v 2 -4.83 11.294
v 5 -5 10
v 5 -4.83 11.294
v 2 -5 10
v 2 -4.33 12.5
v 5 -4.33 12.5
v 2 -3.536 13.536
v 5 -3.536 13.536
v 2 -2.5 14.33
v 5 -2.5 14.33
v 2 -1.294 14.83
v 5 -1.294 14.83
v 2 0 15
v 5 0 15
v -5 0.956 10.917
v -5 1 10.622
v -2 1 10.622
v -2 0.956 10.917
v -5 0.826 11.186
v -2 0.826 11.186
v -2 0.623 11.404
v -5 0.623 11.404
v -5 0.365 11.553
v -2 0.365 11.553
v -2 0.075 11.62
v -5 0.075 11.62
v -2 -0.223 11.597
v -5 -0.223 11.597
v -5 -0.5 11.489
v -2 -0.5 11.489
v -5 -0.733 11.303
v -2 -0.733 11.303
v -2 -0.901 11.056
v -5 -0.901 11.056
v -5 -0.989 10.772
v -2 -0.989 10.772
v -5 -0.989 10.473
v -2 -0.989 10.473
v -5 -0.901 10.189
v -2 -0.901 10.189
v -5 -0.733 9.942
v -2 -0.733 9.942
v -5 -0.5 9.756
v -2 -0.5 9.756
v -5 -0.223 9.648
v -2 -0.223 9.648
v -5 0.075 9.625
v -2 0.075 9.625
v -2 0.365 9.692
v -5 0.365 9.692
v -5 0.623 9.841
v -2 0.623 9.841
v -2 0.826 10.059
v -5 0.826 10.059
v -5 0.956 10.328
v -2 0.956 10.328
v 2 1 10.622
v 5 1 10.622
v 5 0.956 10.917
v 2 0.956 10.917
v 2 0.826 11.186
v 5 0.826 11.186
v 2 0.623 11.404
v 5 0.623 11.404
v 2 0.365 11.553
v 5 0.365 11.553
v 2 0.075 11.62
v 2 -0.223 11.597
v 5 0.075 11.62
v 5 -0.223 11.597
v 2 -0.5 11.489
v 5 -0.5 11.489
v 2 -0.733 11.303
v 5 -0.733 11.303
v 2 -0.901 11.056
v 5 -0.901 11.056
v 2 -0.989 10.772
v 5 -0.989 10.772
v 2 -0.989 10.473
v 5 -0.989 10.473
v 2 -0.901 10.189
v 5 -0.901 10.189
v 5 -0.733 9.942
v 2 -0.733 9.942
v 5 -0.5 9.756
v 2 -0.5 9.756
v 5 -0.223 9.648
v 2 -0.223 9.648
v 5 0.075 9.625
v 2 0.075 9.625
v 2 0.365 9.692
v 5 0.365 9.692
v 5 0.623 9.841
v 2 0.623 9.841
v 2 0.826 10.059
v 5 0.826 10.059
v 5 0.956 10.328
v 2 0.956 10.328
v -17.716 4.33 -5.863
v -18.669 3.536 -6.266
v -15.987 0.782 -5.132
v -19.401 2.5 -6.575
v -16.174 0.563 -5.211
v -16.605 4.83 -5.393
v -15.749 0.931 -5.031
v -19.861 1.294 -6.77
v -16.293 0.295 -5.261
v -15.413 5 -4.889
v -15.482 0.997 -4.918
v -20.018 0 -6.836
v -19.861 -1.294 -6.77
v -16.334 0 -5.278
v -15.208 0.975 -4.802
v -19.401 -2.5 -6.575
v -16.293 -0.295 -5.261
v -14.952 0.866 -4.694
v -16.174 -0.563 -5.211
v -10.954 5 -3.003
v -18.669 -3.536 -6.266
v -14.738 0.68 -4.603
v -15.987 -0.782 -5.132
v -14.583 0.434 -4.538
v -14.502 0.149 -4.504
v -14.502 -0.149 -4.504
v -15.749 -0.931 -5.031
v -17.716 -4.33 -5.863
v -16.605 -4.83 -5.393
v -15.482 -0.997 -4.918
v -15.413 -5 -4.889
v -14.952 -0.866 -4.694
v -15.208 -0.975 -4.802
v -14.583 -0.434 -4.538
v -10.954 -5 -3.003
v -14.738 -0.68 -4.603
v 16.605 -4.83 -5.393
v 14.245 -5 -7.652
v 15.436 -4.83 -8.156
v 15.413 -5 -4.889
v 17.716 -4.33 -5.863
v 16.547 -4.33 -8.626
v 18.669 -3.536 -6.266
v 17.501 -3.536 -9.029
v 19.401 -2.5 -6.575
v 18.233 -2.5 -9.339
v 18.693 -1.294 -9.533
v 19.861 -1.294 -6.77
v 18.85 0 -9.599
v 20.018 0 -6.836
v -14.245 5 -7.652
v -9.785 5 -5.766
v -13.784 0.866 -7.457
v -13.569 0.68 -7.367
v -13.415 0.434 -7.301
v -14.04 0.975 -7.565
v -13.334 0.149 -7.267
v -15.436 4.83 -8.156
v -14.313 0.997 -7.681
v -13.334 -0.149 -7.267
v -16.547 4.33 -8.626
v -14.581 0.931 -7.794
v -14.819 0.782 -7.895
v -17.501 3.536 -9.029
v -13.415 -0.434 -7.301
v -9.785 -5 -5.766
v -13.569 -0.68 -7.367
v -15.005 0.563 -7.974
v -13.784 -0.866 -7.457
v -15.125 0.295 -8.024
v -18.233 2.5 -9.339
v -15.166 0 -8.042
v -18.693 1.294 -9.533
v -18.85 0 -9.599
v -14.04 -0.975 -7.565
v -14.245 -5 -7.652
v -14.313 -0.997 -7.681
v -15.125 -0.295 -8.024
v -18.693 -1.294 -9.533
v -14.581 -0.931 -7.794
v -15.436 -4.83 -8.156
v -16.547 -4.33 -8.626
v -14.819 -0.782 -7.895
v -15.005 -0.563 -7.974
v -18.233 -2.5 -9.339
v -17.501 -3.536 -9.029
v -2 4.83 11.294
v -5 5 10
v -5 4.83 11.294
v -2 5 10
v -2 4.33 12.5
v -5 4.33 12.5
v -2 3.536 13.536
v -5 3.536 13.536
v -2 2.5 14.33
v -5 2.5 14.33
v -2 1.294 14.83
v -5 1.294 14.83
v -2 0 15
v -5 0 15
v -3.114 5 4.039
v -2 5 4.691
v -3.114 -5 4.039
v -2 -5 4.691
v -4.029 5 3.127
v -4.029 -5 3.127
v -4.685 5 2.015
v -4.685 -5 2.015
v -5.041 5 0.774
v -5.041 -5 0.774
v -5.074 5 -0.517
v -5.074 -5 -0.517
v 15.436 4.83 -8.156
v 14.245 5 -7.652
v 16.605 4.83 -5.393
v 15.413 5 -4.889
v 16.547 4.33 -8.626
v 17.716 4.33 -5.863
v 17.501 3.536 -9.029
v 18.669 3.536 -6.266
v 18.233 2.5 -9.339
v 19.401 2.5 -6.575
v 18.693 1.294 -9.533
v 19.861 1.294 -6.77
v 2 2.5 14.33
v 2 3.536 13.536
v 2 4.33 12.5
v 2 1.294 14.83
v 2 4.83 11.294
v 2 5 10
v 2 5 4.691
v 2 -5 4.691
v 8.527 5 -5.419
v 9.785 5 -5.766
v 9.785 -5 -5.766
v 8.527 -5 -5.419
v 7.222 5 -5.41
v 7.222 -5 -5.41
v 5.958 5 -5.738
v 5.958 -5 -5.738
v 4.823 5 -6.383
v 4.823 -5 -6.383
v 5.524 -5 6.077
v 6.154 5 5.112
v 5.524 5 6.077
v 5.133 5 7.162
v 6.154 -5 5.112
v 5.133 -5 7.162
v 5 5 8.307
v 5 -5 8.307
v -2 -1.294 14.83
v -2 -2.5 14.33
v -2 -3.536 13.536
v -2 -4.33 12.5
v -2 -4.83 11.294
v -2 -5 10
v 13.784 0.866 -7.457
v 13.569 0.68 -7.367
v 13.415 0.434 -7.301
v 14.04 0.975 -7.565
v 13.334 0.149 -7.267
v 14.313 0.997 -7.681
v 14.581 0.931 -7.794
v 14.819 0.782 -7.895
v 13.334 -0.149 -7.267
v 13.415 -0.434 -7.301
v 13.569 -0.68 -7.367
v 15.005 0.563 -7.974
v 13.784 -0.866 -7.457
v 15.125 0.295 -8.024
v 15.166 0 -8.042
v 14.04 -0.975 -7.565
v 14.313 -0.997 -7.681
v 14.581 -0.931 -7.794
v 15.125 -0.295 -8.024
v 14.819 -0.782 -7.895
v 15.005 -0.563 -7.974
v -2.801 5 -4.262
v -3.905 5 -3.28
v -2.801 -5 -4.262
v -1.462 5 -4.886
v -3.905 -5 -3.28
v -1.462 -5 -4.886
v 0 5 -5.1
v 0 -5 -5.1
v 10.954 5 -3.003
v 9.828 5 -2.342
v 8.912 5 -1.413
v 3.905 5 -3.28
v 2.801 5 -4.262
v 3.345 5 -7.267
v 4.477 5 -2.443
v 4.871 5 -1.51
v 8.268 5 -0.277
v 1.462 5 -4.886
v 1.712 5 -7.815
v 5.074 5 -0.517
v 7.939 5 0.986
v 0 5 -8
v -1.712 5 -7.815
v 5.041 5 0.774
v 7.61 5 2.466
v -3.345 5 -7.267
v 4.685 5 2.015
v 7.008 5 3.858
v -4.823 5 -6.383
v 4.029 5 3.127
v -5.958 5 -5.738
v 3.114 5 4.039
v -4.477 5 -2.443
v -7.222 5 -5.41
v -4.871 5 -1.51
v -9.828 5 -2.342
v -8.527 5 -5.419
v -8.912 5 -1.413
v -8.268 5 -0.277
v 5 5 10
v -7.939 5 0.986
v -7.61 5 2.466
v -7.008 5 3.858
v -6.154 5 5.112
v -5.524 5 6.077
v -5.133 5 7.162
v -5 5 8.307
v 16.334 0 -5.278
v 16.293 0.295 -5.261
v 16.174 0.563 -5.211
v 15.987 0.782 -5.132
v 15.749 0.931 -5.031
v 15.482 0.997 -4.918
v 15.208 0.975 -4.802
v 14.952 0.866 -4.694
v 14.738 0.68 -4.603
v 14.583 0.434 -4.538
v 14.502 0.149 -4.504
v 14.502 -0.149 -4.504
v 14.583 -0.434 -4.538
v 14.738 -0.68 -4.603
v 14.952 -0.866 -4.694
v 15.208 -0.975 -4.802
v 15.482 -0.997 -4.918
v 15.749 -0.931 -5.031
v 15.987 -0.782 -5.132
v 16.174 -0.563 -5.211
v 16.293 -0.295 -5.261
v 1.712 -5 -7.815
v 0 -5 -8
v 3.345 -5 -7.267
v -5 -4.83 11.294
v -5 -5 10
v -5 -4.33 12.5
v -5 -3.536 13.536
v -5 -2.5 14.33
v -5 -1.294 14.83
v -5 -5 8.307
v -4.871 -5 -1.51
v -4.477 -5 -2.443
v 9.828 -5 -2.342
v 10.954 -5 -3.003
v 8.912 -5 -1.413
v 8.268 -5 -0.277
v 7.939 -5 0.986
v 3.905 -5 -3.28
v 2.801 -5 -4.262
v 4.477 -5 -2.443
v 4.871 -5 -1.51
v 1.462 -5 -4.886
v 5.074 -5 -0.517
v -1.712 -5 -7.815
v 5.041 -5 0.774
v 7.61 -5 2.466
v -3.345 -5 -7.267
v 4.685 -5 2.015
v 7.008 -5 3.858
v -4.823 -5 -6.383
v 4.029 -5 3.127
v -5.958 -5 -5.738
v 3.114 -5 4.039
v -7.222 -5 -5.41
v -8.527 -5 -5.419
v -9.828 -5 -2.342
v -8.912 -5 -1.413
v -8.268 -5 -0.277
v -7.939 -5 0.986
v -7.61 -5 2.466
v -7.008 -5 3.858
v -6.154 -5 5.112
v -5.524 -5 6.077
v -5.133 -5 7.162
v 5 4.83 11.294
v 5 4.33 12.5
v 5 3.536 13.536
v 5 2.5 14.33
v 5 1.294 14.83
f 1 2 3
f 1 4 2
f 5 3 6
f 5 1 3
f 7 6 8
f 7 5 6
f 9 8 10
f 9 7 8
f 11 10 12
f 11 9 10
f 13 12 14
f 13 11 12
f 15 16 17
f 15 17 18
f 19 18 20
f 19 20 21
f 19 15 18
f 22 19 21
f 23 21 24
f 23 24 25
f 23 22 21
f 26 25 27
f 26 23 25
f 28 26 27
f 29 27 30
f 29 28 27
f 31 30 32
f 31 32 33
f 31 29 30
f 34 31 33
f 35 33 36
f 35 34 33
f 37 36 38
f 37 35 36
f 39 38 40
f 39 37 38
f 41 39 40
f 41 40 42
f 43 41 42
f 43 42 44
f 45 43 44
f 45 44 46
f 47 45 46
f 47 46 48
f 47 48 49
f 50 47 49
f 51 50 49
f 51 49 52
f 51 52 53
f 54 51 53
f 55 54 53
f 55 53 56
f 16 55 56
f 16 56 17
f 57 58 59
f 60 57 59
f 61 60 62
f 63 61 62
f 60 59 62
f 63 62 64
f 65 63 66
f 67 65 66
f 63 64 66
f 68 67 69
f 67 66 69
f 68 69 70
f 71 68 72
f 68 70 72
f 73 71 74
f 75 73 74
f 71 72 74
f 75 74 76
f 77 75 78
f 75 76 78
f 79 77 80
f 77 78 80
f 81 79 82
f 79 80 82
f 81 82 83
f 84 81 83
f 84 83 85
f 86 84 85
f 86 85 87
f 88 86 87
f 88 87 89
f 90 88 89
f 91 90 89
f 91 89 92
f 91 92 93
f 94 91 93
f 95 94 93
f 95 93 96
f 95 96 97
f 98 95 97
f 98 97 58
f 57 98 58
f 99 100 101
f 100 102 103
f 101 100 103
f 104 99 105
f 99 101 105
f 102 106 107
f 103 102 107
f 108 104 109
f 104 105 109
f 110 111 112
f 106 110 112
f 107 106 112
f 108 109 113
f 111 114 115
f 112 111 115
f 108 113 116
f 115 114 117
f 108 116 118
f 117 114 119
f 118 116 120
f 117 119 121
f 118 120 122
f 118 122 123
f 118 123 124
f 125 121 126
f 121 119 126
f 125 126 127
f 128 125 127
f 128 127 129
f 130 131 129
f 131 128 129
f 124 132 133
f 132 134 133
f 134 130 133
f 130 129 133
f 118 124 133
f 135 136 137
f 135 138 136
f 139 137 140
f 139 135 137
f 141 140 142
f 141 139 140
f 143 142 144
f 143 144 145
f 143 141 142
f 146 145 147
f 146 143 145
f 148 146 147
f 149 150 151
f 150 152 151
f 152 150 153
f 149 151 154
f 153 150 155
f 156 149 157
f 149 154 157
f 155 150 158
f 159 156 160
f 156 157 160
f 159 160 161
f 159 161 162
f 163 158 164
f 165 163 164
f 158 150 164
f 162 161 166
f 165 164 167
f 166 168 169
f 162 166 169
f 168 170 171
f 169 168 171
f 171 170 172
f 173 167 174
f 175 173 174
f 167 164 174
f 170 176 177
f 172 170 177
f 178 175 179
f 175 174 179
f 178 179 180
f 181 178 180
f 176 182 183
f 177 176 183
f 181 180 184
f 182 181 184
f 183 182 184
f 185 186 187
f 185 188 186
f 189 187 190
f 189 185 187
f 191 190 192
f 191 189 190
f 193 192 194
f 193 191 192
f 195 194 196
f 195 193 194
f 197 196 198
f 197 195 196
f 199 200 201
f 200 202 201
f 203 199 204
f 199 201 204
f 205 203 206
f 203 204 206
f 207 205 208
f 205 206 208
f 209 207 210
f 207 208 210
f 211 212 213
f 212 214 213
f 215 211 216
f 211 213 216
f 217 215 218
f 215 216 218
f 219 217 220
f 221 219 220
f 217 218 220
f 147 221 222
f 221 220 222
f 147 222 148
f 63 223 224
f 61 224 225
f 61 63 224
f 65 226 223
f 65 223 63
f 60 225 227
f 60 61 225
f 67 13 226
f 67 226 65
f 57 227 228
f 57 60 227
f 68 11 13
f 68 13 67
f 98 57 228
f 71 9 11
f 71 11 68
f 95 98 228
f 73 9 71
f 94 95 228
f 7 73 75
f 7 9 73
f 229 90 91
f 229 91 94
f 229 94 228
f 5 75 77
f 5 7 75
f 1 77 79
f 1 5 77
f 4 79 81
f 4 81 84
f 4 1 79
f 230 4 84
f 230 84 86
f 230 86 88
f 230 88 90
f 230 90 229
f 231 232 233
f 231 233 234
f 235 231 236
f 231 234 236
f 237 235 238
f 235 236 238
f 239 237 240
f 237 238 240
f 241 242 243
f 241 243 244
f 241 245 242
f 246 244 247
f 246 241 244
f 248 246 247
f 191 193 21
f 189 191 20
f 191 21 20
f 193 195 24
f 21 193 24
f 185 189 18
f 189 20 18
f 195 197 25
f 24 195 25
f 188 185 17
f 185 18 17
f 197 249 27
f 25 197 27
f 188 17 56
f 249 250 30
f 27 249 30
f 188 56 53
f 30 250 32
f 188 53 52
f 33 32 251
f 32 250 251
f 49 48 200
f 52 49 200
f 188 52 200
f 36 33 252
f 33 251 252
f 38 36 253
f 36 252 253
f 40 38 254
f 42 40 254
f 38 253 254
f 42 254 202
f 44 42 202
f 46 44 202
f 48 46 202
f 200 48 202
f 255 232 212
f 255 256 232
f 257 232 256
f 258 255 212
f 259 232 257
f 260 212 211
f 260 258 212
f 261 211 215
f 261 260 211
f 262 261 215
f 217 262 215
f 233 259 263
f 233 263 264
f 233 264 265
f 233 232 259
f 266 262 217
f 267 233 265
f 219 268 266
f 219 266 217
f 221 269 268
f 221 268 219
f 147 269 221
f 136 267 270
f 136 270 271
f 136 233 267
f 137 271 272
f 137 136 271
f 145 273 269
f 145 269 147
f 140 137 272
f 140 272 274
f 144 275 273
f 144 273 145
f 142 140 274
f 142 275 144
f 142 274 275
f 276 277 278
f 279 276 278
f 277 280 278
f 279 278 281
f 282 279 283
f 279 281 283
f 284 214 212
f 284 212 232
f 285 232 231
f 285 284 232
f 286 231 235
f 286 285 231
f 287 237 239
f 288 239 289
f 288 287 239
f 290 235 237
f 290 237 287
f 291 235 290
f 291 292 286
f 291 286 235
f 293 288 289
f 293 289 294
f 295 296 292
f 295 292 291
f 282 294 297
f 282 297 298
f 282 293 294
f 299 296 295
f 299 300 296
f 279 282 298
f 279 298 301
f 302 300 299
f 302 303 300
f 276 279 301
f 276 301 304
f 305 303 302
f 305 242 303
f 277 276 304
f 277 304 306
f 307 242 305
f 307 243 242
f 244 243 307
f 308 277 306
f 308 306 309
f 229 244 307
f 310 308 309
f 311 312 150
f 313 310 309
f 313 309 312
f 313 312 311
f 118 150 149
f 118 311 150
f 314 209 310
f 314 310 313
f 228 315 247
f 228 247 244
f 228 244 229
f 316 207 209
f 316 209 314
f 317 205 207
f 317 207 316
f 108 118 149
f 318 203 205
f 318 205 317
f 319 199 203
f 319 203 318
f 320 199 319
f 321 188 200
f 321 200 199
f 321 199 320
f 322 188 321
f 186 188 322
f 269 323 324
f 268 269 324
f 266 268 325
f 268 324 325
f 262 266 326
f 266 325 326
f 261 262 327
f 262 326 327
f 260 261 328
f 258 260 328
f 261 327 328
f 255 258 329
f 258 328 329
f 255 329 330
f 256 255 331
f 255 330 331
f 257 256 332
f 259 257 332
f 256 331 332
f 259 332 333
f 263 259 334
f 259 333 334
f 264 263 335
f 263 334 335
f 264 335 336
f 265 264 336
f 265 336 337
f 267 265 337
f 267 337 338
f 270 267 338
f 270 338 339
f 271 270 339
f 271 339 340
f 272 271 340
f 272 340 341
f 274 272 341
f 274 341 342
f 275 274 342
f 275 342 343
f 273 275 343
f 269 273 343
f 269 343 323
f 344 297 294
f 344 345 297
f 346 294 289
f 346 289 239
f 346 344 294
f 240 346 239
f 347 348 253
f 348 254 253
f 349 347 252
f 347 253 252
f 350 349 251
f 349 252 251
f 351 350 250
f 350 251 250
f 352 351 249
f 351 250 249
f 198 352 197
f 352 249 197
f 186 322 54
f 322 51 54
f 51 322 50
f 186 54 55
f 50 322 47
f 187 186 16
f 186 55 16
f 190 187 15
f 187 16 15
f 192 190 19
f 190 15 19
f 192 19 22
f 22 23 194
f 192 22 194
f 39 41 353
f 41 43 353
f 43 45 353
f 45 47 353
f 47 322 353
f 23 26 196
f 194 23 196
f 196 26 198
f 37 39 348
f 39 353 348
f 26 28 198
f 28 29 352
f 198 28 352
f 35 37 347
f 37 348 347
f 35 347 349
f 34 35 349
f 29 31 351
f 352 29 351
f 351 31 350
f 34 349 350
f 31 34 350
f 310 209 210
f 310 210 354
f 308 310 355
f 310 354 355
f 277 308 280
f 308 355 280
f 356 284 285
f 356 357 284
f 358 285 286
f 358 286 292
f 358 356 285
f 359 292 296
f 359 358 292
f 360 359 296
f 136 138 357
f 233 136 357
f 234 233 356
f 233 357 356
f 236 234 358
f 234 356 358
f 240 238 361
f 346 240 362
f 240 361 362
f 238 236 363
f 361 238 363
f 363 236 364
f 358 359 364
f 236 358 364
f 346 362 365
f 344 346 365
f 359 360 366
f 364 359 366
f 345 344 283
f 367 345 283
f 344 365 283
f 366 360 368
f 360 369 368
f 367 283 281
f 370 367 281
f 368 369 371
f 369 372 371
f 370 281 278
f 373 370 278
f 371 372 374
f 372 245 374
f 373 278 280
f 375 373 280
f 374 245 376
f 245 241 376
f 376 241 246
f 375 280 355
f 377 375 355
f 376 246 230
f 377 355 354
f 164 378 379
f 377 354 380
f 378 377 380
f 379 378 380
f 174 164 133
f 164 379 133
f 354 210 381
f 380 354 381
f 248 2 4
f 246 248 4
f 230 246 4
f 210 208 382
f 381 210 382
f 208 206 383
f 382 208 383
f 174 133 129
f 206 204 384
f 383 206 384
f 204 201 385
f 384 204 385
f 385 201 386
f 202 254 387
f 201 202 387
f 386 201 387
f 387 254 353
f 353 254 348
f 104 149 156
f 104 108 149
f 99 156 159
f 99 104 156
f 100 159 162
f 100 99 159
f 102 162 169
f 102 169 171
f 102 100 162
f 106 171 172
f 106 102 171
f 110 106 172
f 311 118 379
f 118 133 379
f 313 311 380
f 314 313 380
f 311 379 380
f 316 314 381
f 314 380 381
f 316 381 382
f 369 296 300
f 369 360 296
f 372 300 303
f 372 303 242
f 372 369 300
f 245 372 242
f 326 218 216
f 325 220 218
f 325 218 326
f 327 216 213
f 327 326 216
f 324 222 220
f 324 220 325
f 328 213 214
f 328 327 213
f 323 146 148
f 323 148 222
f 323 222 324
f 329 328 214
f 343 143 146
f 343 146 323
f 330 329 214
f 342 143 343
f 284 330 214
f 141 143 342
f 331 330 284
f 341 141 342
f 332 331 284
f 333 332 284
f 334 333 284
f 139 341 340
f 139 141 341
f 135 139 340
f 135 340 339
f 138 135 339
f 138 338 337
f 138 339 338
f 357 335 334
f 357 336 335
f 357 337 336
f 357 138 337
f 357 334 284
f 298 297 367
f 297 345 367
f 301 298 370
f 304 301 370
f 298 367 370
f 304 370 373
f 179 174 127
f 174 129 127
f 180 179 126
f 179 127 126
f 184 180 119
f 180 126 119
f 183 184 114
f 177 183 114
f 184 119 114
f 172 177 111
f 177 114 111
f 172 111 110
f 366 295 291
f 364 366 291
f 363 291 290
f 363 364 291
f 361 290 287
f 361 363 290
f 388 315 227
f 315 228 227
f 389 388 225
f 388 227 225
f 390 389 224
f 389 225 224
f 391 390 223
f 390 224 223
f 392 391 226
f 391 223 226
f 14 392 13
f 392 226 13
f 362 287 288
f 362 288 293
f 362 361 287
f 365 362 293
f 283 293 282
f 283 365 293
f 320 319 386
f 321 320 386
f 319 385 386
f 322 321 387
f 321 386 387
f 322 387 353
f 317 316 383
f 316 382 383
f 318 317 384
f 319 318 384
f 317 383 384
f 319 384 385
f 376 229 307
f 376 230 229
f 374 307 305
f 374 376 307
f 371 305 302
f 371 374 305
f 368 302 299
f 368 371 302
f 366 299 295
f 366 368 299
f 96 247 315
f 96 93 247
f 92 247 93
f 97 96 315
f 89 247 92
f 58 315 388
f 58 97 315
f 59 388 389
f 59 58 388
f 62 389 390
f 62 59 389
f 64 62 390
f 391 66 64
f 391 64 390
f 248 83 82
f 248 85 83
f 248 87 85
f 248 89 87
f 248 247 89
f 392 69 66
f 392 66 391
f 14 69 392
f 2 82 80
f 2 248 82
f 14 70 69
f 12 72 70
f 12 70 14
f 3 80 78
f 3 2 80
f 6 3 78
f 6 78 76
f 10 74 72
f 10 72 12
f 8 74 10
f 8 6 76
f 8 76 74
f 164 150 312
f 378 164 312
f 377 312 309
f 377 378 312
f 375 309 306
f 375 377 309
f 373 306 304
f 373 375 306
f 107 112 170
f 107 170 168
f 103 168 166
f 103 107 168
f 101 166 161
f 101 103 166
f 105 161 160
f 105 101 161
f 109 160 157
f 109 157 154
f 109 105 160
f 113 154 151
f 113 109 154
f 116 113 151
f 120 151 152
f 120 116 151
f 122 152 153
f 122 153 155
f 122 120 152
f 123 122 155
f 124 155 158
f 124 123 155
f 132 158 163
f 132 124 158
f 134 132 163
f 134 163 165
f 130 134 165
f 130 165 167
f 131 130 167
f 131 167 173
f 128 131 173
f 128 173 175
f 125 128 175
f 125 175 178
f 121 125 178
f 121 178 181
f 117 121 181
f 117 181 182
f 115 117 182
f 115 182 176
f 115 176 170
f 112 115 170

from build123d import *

# Parameters (mm, degrees)
F1_DEPTH = 5
F2_R     = 1
F3_DEPTH = 25
F4_R     = 1
F5_DEPTH = 25
F6_R     = 4.99999
F7_R     = 5


# Not quite as in the source:
# - a fillet or chamfer is up to 0.001 mm smaller than in the source, because OpenCascade refuses the exact size
# - a feature names something its author has since deleted; it is built from what else it names


with BuildPart() as f1:
    # F0 (on Front) → F1 (new body, symmetric)
    with BuildSketch(Plane.XZ):
        with BuildLine():
            ThreePointArc((3.9053168747, -3.2800152603), (2.1542889978, -4.62266578), (0, -5.1))
            Line((0, -5.1), (0, -8))
            ThreePointArc((0, -8), (3.7724872299, -7.0546679653), (6.6534112025, -4.4420850251))
            Line((6.6534112025, -4.4420850251), (3.9053168747, -3.2800152603))
        make_face()
        with BuildLine():
            ThreePointArc((5.0737374807, -0.5169022898), (4.6972920498, -1.9863150301), (3.9053168747, -3.2800152603))
            Line((3.9053168747, -3.2800152603), (6.6534112025, -4.4420850251))
            ThreePointArc((6.6534112025, -4.4420850251), (7.3683012546, -3.1157882825), (7.8218318085, -1.6789720546))
            Line((7.8218318085, -1.6789720546), (5.0737374807, -0.5169022898))
        make_face()
        with BuildLine():
            ThreePointArc((2, 4.6914816423), (4.392181267, 2.5920539573), (5.0737374807, -0.5169022898))
            Line((5.0737374807, -0.5169022898), (7.8218318085, -1.6789720546))
            ThreePointArc((7.8218318085, -1.6789720546), (7.5363895919, 2.683809218), (5, 6.2449979984))
            ThreePointArc((5, 6.2449979984), (3.5795567819, 7.1544932207), (2, 7.7459666924))
            Line((2, 7.7459666924), (2, 4.6914816423))
        make_face()
        with BuildLine():
            ThreePointArc((7.8218318085, -1.6789720546), (7.3683012546, -3.1157882825), (6.6534112025, -4.4420850251))
            Line((6.6534112025, -4.4420850251), (18.8496842561, -9.5994480802))
            Line((18.8496842561, -9.5994480802), (20.018104862, -6.8363351098))
            Line((20.018104862, -6.8363351098), (7.8218318085, -1.6789720546))
        make_face()
        with BuildLine():
            Line((2, 15), (2, 7.7459666924))
            ThreePointArc((2, 7.7459666924), (3.5795567819, 7.1544932207), (5, 6.2449979984))
            Line((5, 6.2449979984), (5, 15))
            Line((5, 15), (2, 15))
        make_face()
    extrude(amount=F1_DEPTH, both=True)

    # F2 (on face) → F3 (cut)
    with BuildSketch(Plane(origin=(0.584210303, 0, 1.3815564852), x_dir=(0.9210376568, 0, -0.3894735353), z_dir=(0.3894735353, 0, 0.9210376568))):
        with Locations((16.1, 0)):
            Circle(F2_R)
    extrude(amount=-F3_DEPTH, mode=Mode.SUBTRACT)

    # F4 (on face) → F5 (cut)
    with BuildSketch(Plane.YZ.offset(5)):
        with Locations((0, 10.6224989992)):
            Circle(F4_R)
    extrude(amount=-F5_DEPTH, mode=Mode.SUBTRACT)

    # F6 (radius 5 in the source; OpenCascade refuses exactly that, so slightly less here)
    f6_edges = [f1.edges().sort_by_distance(p)[0] for p in [
        (19.433895, 5, -8.217892),
        (19.433895, -5, -8.217892),
        (3.5, -5, 15),
        (3.5, 5, 15),
    ]]
    fillet(f6_edges, radius=F6_R)

    # F7
    f7_edges = [f1.edges().sort_by_distance(p)[0] for p in [
        (5, 0, 6.244998),
        (7.821832, 0, -1.678972),
        (6.653411, 0, -4.442085),
    ]]
    fillet(f7_edges, radius=F7_R)

    # F8: F1 across plane


with BuildPart() as f1_1:
    add(f1.part)
    add(f1.part.mirror(Plane.YZ))


solid = f1_1.part
